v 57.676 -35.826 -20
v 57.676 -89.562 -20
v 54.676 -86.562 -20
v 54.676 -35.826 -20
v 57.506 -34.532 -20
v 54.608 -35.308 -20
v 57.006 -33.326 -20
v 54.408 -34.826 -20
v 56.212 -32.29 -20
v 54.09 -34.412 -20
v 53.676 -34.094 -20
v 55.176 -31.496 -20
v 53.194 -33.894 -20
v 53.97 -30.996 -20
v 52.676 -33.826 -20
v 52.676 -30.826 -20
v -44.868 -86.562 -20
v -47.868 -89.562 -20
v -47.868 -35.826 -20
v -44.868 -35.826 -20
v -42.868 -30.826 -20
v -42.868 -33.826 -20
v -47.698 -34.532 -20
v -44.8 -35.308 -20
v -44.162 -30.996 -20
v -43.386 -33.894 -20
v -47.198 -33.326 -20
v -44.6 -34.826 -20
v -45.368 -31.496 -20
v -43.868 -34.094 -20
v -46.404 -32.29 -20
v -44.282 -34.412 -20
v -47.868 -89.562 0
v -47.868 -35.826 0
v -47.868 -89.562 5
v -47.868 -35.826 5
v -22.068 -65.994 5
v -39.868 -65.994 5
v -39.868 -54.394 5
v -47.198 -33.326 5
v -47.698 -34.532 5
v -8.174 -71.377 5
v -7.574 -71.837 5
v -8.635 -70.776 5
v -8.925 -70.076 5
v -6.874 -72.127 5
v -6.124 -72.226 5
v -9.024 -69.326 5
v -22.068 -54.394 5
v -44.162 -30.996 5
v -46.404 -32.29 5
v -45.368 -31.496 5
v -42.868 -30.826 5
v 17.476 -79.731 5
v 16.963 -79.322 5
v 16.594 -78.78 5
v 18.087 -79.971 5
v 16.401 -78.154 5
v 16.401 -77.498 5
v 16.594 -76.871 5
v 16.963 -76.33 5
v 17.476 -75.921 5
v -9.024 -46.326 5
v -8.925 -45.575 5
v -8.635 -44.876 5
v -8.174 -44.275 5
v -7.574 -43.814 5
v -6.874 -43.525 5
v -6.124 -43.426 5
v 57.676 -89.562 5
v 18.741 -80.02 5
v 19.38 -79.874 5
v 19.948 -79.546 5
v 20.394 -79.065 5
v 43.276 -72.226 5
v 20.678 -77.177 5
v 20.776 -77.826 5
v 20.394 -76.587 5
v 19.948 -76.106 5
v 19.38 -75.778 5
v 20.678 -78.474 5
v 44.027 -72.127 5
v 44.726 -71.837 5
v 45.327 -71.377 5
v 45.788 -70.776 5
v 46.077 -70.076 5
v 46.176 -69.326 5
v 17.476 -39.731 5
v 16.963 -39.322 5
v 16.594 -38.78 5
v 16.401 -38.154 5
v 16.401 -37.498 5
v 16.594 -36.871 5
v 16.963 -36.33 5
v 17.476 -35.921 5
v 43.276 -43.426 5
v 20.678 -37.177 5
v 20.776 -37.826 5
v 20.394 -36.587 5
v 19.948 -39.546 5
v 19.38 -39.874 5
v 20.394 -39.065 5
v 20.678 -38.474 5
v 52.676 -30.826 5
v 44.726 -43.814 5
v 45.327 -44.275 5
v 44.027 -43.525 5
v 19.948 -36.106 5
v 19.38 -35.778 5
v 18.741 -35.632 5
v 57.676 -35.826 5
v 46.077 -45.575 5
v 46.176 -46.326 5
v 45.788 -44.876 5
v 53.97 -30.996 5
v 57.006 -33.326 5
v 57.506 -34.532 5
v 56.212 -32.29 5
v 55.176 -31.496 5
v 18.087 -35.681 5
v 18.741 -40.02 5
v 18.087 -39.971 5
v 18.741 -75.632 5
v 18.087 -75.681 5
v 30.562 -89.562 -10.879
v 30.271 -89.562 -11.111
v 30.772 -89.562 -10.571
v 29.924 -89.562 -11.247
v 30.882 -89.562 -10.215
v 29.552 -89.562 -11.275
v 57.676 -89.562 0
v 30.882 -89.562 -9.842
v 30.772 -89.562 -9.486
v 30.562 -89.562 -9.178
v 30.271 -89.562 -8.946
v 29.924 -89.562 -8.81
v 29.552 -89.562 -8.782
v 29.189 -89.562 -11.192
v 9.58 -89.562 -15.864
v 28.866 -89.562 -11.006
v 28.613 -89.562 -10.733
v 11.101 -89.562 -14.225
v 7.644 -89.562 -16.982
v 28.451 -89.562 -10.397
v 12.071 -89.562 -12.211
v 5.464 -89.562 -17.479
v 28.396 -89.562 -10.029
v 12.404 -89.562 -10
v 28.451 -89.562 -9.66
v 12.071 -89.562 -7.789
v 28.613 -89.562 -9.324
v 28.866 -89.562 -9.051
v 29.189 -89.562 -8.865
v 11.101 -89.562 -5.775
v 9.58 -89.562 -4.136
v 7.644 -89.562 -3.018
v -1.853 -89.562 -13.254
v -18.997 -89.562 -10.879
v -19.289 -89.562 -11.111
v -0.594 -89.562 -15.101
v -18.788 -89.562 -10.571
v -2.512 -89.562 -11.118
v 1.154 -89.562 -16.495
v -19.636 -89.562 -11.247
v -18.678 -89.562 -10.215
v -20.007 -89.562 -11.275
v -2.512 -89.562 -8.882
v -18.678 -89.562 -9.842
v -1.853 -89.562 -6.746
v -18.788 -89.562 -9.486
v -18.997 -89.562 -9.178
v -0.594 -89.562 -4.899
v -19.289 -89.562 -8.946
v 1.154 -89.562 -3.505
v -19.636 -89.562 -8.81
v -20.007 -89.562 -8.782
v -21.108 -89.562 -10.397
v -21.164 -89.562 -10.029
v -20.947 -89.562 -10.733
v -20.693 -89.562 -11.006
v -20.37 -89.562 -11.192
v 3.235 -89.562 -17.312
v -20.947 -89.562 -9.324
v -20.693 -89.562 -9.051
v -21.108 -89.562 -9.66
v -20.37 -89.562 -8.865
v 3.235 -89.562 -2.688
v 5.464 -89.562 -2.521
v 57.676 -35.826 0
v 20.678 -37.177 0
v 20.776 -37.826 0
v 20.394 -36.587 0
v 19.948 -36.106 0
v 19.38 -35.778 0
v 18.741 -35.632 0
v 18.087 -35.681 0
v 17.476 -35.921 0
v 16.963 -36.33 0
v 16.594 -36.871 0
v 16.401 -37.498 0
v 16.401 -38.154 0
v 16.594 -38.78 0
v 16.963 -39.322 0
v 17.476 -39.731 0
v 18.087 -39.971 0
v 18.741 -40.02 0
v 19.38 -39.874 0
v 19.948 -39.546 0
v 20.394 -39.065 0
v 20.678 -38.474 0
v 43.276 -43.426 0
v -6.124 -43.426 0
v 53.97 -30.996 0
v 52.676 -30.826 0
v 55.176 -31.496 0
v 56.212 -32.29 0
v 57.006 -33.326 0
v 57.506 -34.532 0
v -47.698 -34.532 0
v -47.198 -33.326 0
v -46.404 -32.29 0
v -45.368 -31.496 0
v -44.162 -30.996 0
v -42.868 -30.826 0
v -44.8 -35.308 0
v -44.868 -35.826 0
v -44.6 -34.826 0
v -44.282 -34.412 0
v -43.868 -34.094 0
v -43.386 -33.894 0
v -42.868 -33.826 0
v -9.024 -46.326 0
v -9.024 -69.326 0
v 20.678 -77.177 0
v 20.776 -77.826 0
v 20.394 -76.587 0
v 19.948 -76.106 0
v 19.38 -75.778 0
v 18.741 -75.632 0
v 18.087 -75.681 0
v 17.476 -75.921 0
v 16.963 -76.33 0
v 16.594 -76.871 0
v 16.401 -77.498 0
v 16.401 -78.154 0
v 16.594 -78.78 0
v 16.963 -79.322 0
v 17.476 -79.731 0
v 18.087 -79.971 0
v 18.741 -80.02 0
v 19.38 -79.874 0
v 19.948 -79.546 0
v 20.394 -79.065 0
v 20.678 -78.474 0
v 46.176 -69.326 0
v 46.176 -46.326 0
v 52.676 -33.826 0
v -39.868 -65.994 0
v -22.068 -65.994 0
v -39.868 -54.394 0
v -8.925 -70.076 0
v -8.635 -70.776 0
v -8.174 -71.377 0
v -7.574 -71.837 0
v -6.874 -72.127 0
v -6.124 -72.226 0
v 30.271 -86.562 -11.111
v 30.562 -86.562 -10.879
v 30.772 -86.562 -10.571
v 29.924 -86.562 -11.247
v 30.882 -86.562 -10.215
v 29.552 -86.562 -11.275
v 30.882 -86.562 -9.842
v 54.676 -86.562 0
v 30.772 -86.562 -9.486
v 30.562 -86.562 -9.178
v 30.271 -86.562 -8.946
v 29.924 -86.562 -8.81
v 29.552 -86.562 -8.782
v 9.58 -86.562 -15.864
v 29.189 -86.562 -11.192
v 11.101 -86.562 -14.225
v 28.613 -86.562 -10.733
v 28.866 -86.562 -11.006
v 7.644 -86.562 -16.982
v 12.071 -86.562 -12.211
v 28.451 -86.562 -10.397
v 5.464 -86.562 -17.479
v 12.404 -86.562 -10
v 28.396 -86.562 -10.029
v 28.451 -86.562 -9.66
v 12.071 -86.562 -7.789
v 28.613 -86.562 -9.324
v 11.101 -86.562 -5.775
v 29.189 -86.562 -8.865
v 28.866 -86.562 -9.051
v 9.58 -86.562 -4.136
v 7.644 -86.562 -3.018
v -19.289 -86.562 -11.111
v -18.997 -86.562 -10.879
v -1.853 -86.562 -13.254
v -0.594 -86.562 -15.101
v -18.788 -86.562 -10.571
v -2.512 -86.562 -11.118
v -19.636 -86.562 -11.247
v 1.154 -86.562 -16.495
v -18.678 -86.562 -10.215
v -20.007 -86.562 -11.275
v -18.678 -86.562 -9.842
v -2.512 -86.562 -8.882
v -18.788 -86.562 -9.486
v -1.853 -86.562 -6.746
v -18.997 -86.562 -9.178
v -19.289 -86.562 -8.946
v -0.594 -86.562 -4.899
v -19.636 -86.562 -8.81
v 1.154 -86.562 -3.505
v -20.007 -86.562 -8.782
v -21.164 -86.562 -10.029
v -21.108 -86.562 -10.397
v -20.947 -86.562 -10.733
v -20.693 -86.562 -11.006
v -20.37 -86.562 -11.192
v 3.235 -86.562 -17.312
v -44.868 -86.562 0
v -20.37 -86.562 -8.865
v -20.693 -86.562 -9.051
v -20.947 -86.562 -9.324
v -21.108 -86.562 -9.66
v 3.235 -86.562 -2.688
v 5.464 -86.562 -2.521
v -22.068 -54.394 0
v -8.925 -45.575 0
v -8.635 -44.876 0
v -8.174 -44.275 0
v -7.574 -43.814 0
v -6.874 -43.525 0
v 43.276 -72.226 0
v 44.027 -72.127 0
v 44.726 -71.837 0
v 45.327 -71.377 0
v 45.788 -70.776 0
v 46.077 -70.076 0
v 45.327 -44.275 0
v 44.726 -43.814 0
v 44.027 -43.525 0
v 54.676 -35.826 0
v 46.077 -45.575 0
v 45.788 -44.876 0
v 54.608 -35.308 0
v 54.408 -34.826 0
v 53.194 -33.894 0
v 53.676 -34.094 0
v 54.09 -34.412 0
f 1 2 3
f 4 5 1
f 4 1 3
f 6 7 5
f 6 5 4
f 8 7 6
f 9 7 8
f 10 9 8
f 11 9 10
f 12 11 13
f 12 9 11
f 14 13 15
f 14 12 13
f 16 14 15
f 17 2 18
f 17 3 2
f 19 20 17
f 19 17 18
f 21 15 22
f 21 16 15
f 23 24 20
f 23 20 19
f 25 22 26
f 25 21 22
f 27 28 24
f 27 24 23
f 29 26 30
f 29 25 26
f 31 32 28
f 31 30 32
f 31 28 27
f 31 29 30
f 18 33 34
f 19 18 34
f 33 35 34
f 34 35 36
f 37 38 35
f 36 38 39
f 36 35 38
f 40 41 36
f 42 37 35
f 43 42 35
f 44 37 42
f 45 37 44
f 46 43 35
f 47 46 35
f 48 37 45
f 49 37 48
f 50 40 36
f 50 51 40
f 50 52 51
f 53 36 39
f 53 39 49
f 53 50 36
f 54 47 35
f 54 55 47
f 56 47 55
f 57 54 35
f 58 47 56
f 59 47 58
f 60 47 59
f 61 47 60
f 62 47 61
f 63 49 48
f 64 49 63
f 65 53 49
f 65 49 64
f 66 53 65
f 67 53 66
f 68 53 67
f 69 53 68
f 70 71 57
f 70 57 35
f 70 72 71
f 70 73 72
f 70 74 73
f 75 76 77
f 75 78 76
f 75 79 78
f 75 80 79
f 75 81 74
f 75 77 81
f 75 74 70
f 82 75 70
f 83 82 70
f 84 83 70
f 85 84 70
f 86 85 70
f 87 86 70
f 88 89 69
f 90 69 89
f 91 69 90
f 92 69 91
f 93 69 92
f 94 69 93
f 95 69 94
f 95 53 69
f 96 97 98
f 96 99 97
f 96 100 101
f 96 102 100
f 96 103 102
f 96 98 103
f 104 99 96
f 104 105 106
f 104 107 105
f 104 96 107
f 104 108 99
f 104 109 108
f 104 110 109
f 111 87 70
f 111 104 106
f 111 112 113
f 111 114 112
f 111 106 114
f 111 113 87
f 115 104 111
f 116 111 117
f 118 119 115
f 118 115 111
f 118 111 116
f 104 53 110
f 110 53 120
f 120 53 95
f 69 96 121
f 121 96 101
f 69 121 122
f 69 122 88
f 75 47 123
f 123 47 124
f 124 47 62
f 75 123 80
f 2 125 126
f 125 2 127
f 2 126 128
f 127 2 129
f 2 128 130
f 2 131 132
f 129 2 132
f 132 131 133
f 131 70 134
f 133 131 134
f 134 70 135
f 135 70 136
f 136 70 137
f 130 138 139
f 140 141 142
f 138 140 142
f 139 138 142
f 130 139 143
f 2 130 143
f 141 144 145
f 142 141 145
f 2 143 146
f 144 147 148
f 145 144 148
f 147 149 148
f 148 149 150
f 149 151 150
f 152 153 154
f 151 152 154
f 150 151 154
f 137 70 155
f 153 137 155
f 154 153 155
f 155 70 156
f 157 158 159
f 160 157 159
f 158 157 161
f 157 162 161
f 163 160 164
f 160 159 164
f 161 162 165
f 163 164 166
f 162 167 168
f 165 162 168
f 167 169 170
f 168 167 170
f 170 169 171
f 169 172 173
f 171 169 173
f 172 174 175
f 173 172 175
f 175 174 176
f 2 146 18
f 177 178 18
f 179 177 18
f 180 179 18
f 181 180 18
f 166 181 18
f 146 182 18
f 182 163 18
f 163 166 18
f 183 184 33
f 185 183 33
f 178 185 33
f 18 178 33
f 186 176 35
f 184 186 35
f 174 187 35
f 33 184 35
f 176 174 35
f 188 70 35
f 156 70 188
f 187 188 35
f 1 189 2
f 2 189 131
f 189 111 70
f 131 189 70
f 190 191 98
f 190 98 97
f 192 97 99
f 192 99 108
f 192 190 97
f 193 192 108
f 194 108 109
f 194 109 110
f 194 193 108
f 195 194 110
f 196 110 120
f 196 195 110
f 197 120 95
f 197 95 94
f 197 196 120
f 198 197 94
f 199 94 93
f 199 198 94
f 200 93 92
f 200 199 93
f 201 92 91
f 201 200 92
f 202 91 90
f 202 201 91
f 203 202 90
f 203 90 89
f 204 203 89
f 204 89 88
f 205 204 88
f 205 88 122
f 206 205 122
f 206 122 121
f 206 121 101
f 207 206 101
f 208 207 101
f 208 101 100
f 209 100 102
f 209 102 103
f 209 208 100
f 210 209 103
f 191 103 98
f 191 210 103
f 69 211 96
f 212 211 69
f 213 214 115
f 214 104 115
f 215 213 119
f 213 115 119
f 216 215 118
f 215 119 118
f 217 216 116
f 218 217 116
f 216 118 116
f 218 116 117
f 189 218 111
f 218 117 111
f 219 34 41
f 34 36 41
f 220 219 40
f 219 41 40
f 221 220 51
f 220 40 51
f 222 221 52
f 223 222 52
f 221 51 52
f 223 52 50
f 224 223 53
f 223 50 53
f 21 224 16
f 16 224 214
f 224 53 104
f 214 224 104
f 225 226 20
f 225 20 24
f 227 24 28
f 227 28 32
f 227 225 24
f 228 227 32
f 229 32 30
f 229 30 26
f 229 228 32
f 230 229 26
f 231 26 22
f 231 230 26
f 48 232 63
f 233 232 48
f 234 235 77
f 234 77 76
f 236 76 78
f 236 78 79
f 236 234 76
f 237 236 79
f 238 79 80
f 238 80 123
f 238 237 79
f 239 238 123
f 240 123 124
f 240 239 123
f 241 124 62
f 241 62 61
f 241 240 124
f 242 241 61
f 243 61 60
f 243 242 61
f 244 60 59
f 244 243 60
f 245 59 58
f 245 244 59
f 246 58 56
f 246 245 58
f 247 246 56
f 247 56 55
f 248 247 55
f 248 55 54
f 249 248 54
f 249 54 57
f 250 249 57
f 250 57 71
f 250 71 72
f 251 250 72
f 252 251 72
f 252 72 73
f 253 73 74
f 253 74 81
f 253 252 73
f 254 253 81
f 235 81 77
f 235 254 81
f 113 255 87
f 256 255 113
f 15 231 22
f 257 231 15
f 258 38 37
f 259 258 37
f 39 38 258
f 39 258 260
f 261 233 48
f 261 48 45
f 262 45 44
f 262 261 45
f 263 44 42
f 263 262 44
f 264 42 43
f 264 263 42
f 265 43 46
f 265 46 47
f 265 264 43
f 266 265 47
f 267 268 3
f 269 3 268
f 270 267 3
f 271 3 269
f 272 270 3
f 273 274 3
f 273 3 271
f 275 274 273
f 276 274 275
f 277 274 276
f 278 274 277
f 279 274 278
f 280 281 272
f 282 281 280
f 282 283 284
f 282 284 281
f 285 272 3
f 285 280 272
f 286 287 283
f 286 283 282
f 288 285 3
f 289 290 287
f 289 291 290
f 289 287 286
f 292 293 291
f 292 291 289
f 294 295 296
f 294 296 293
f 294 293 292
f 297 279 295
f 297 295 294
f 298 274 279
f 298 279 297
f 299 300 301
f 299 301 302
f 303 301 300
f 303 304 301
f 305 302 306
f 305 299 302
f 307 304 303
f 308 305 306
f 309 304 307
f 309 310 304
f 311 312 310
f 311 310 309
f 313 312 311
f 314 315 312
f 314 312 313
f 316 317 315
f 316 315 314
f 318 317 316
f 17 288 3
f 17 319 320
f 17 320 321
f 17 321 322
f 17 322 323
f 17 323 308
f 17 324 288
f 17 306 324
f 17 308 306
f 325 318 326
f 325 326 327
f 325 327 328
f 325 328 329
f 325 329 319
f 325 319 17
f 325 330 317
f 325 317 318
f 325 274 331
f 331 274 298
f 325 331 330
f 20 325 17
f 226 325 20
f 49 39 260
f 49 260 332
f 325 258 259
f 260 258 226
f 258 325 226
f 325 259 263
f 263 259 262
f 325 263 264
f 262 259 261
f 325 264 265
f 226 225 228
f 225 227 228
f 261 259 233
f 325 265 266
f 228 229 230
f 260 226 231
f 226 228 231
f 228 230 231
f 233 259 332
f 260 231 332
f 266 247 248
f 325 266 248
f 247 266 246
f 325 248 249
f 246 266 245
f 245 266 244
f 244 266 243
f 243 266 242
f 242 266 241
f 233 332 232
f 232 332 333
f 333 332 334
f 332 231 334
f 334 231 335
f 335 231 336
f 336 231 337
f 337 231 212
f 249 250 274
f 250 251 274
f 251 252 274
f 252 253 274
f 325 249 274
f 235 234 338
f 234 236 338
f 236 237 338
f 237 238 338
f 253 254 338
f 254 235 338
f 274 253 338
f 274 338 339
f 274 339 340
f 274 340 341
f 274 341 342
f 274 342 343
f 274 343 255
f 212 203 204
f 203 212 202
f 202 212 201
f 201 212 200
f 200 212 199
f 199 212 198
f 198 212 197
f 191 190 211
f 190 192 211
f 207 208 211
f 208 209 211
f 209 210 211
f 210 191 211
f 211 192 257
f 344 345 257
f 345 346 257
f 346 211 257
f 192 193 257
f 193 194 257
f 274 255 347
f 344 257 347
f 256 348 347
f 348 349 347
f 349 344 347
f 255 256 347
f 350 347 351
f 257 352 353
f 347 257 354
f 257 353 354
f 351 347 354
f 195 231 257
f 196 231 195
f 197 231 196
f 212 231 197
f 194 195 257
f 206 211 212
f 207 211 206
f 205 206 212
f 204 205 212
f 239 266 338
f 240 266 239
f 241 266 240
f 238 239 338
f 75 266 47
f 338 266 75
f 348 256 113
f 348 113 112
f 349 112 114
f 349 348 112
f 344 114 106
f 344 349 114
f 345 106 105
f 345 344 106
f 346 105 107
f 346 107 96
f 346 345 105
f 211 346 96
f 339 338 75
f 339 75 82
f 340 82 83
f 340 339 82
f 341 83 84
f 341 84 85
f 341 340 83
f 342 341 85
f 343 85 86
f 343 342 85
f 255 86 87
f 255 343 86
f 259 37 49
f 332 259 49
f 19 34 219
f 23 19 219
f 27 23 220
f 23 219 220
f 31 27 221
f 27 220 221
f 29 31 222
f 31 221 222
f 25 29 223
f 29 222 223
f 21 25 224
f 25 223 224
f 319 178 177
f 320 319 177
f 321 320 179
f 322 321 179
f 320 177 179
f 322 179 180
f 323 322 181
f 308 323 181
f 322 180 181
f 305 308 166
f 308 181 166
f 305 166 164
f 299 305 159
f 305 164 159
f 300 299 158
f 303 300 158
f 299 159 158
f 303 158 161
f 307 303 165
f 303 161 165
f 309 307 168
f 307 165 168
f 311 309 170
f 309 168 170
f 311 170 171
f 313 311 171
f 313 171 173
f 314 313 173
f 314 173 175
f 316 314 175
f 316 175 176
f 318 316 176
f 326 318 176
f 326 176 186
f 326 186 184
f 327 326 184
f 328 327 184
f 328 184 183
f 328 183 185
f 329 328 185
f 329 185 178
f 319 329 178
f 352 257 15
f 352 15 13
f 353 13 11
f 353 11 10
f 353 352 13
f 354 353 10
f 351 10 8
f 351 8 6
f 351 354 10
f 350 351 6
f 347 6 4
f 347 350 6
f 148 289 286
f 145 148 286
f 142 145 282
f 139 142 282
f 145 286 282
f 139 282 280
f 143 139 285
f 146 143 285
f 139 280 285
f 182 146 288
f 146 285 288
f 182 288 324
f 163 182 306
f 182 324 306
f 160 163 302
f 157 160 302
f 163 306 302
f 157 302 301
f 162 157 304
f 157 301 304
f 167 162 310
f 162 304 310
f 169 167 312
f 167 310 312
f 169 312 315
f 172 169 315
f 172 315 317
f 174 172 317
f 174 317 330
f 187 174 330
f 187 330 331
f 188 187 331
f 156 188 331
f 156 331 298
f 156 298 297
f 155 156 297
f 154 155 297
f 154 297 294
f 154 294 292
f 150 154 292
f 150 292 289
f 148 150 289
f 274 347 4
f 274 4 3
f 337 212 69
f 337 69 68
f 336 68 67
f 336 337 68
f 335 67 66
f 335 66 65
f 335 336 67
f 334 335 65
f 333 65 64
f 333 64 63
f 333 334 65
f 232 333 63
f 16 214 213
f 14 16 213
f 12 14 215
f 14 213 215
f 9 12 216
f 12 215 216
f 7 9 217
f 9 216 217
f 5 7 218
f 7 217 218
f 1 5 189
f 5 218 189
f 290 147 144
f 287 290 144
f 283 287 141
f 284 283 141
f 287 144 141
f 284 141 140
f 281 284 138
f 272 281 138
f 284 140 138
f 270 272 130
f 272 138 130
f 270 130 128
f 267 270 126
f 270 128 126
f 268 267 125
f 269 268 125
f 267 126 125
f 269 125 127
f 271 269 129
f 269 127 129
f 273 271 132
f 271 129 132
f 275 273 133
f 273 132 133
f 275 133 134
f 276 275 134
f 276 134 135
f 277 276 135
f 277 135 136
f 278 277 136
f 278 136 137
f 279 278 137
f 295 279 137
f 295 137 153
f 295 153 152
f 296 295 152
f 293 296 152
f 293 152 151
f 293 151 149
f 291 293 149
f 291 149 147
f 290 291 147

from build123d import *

# Parameters (mm, degrees)
ESBO_O1_W                                      = 105.544372836
ESBO_O1_H                                      = 58.736189027
ESBO_O1_R                                      = 2.2
RESSALTO_EXTRUS_O1_DEPTH                       = 5
ESBO_O2_W                                      = 17.8
ESBO_O2_H                                      = 11.6
CORTE_EXTRUS_O1_DEPTH                          = 10
FILETE1_R                                      = 5
RESSALTO_EXTRUS_O2_DEPTH                       = 20
BROCA_DE_ROSQUEAR_PARA_TARRAXA_DE_M3X0_5_D     = 2.5
BROCA_DE_ROSQUEAR_PARA_TARRAXA_DE_M3X0_5_DEPTH = 3
ESBO_O4_R                                      = 7.5
CORTE_EXTRUS_O2_DEPTH                          = 10


with BuildPart() as part:
    # Esboço1 → Ressalto-extrusão1 (new body)
    with BuildSketch(Plane.XY):
        with Locations((4.903986461, -60.193985815)):
            Rectangle(ESBO_O1_W, ESBO_O1_H)
        with Locations((18.576172879, -37.825891301)):
            Circle(ESBO_O1_R, mode=Mode.SUBTRACT)
        with Locations((18.576172879, -77.825891301)):
            Circle(ESBO_O1_R, mode=Mode.SUBTRACT)
        with BuildLine():
            Line((43.276172879, -43.425891301), (-6.123827121, -43.425891301))
            ThreePointArc((-6.123827121, -43.425891301), (-8.174436786, -44.275281636), (-9.023827121, -46.325891301))
            Line((-9.023827121, -46.325891301), (-9.023827121, -69.325891301))
            ThreePointArc((-9.023827121, -69.325891301), (-8.174436786, -71.376500966), (-6.123827121, -72.225891301))
            Line((-6.123827121, -72.225891301), (43.276172879, -72.225891301))
            ThreePointArc((43.276172879, -72.225891301), (45.326782544, -71.376500966), (46.176172879, -69.325891301))
            Line((46.176172879, -69.325891301), (46.176172879, -46.325891301))
            ThreePointArc((46.176172879, -46.325891301), (45.326782544, -44.275281636), (43.276172879, -43.425891301))
        make_face(mode=Mode.SUBTRACT)
    extrude(amount=RESSALTO_EXTRUS_O1_DEPTH)

    # Esboço2 → Corte-extrusão1 (cut)
    with BuildSketch(Plane.XY.offset(5)):
        with Locations((-30.968199957, -60.193985814)):
            Rectangle(ESBO_O2_W, ESBO_O2_H)
    extrude(amount=-CORTE_EXTRUS_O1_DEPTH, mode=Mode.SUBTRACT)

    # Filete1
    filete1_edges = [part.edges().sort_by_distance(p)[0] for p in [
        (-47.868199957, -30.825891301, 2.5),
        (57.676172879, -30.825891301, 2.5),
    ]]
    fillet(filete1_edges, radius=FILETE1_R)

    # Esboço3 → Ressalto-extrusão2 (add)
    with BuildSketch(Plane(origin=(0, 0, 0), x_dir=(-1, 0, 0), z_dir=(0, 0, -1))):
        with BuildLine():
            Line((42.868199957, -30.825891301), (-52.676172879, -30.825891301))
            ThreePointArc((-52.676172879, -30.825891301), (-56.211706785, -32.290357395), (-57.676172879, -35.825891301))
            Line((-57.676172879, -35.825891301), (-57.676172879, -89.562080328))
            Line((-57.676172879, -89.562080328), (47.868199957, -89.562080328))
            Line((47.868199957, -89.562080328), (47.868199957, -35.825891301))
            ThreePointArc((47.868199957, -35.825891301), (46.403733863, -32.290357395), (42.868199957, -30.825891301))
        make_face()
        with BuildLine():
            Line((42.868199957, -33.825891301), (-52.676172879, -33.825891301))
            ThreePointArc((-52.676172879, -33.825891301), (-54.090386441, -34.411677739), (-54.676172879, -35.825891301))
            Line((-54.676172879, -35.825891301), (-54.676172879, -86.562080328))
            Line((-54.676172879, -86.562080328), (44.868199957, -86.562080328))
            Line((44.868199957, -86.562080328), (44.868199957, -35.825891301))
            ThreePointArc((44.868199957, -35.825891301), (44.282413519, -34.411677739), (42.868199957, -33.825891301))
        make_face(mode=Mode.SUBTRACT)
    extrude(amount=RESSALTO_EXTRUS_O2_DEPTH)

    # Broca de rosquear para tarraxa de M3x0.51
    with Locations(Plane(origin=(0, -86.562080328, 0), x_dir=(1, 0, 0), z_dir=(0, 1, 0))):
        with Locations((29.645811084, 10.02860531), (-19.913744381, 10.02860531)):
            Hole(BROCA_DE_ROSQUEAR_PARA_TARRAXA_DE_M3X0_5_D / 2, depth=BROCA_DE_ROSQUEAR_PARA_TARRAXA_DE_M3X0_5_DEPTH)

    # Esboço4 → Corte-extrusão2 (cut)
    with BuildSketch(Plane(origin=(0, -86.562080328, 0), x_dir=(1, 0, 0), z_dir=(0, 1, 0))):
        with Locations((4.903986461, 10)):
            Circle(ESBO_O4_R)
    extrude(amount=-CORTE_EXTRUS_O2_DEPTH, mode=Mode.SUBTRACT)


solid = part.part
